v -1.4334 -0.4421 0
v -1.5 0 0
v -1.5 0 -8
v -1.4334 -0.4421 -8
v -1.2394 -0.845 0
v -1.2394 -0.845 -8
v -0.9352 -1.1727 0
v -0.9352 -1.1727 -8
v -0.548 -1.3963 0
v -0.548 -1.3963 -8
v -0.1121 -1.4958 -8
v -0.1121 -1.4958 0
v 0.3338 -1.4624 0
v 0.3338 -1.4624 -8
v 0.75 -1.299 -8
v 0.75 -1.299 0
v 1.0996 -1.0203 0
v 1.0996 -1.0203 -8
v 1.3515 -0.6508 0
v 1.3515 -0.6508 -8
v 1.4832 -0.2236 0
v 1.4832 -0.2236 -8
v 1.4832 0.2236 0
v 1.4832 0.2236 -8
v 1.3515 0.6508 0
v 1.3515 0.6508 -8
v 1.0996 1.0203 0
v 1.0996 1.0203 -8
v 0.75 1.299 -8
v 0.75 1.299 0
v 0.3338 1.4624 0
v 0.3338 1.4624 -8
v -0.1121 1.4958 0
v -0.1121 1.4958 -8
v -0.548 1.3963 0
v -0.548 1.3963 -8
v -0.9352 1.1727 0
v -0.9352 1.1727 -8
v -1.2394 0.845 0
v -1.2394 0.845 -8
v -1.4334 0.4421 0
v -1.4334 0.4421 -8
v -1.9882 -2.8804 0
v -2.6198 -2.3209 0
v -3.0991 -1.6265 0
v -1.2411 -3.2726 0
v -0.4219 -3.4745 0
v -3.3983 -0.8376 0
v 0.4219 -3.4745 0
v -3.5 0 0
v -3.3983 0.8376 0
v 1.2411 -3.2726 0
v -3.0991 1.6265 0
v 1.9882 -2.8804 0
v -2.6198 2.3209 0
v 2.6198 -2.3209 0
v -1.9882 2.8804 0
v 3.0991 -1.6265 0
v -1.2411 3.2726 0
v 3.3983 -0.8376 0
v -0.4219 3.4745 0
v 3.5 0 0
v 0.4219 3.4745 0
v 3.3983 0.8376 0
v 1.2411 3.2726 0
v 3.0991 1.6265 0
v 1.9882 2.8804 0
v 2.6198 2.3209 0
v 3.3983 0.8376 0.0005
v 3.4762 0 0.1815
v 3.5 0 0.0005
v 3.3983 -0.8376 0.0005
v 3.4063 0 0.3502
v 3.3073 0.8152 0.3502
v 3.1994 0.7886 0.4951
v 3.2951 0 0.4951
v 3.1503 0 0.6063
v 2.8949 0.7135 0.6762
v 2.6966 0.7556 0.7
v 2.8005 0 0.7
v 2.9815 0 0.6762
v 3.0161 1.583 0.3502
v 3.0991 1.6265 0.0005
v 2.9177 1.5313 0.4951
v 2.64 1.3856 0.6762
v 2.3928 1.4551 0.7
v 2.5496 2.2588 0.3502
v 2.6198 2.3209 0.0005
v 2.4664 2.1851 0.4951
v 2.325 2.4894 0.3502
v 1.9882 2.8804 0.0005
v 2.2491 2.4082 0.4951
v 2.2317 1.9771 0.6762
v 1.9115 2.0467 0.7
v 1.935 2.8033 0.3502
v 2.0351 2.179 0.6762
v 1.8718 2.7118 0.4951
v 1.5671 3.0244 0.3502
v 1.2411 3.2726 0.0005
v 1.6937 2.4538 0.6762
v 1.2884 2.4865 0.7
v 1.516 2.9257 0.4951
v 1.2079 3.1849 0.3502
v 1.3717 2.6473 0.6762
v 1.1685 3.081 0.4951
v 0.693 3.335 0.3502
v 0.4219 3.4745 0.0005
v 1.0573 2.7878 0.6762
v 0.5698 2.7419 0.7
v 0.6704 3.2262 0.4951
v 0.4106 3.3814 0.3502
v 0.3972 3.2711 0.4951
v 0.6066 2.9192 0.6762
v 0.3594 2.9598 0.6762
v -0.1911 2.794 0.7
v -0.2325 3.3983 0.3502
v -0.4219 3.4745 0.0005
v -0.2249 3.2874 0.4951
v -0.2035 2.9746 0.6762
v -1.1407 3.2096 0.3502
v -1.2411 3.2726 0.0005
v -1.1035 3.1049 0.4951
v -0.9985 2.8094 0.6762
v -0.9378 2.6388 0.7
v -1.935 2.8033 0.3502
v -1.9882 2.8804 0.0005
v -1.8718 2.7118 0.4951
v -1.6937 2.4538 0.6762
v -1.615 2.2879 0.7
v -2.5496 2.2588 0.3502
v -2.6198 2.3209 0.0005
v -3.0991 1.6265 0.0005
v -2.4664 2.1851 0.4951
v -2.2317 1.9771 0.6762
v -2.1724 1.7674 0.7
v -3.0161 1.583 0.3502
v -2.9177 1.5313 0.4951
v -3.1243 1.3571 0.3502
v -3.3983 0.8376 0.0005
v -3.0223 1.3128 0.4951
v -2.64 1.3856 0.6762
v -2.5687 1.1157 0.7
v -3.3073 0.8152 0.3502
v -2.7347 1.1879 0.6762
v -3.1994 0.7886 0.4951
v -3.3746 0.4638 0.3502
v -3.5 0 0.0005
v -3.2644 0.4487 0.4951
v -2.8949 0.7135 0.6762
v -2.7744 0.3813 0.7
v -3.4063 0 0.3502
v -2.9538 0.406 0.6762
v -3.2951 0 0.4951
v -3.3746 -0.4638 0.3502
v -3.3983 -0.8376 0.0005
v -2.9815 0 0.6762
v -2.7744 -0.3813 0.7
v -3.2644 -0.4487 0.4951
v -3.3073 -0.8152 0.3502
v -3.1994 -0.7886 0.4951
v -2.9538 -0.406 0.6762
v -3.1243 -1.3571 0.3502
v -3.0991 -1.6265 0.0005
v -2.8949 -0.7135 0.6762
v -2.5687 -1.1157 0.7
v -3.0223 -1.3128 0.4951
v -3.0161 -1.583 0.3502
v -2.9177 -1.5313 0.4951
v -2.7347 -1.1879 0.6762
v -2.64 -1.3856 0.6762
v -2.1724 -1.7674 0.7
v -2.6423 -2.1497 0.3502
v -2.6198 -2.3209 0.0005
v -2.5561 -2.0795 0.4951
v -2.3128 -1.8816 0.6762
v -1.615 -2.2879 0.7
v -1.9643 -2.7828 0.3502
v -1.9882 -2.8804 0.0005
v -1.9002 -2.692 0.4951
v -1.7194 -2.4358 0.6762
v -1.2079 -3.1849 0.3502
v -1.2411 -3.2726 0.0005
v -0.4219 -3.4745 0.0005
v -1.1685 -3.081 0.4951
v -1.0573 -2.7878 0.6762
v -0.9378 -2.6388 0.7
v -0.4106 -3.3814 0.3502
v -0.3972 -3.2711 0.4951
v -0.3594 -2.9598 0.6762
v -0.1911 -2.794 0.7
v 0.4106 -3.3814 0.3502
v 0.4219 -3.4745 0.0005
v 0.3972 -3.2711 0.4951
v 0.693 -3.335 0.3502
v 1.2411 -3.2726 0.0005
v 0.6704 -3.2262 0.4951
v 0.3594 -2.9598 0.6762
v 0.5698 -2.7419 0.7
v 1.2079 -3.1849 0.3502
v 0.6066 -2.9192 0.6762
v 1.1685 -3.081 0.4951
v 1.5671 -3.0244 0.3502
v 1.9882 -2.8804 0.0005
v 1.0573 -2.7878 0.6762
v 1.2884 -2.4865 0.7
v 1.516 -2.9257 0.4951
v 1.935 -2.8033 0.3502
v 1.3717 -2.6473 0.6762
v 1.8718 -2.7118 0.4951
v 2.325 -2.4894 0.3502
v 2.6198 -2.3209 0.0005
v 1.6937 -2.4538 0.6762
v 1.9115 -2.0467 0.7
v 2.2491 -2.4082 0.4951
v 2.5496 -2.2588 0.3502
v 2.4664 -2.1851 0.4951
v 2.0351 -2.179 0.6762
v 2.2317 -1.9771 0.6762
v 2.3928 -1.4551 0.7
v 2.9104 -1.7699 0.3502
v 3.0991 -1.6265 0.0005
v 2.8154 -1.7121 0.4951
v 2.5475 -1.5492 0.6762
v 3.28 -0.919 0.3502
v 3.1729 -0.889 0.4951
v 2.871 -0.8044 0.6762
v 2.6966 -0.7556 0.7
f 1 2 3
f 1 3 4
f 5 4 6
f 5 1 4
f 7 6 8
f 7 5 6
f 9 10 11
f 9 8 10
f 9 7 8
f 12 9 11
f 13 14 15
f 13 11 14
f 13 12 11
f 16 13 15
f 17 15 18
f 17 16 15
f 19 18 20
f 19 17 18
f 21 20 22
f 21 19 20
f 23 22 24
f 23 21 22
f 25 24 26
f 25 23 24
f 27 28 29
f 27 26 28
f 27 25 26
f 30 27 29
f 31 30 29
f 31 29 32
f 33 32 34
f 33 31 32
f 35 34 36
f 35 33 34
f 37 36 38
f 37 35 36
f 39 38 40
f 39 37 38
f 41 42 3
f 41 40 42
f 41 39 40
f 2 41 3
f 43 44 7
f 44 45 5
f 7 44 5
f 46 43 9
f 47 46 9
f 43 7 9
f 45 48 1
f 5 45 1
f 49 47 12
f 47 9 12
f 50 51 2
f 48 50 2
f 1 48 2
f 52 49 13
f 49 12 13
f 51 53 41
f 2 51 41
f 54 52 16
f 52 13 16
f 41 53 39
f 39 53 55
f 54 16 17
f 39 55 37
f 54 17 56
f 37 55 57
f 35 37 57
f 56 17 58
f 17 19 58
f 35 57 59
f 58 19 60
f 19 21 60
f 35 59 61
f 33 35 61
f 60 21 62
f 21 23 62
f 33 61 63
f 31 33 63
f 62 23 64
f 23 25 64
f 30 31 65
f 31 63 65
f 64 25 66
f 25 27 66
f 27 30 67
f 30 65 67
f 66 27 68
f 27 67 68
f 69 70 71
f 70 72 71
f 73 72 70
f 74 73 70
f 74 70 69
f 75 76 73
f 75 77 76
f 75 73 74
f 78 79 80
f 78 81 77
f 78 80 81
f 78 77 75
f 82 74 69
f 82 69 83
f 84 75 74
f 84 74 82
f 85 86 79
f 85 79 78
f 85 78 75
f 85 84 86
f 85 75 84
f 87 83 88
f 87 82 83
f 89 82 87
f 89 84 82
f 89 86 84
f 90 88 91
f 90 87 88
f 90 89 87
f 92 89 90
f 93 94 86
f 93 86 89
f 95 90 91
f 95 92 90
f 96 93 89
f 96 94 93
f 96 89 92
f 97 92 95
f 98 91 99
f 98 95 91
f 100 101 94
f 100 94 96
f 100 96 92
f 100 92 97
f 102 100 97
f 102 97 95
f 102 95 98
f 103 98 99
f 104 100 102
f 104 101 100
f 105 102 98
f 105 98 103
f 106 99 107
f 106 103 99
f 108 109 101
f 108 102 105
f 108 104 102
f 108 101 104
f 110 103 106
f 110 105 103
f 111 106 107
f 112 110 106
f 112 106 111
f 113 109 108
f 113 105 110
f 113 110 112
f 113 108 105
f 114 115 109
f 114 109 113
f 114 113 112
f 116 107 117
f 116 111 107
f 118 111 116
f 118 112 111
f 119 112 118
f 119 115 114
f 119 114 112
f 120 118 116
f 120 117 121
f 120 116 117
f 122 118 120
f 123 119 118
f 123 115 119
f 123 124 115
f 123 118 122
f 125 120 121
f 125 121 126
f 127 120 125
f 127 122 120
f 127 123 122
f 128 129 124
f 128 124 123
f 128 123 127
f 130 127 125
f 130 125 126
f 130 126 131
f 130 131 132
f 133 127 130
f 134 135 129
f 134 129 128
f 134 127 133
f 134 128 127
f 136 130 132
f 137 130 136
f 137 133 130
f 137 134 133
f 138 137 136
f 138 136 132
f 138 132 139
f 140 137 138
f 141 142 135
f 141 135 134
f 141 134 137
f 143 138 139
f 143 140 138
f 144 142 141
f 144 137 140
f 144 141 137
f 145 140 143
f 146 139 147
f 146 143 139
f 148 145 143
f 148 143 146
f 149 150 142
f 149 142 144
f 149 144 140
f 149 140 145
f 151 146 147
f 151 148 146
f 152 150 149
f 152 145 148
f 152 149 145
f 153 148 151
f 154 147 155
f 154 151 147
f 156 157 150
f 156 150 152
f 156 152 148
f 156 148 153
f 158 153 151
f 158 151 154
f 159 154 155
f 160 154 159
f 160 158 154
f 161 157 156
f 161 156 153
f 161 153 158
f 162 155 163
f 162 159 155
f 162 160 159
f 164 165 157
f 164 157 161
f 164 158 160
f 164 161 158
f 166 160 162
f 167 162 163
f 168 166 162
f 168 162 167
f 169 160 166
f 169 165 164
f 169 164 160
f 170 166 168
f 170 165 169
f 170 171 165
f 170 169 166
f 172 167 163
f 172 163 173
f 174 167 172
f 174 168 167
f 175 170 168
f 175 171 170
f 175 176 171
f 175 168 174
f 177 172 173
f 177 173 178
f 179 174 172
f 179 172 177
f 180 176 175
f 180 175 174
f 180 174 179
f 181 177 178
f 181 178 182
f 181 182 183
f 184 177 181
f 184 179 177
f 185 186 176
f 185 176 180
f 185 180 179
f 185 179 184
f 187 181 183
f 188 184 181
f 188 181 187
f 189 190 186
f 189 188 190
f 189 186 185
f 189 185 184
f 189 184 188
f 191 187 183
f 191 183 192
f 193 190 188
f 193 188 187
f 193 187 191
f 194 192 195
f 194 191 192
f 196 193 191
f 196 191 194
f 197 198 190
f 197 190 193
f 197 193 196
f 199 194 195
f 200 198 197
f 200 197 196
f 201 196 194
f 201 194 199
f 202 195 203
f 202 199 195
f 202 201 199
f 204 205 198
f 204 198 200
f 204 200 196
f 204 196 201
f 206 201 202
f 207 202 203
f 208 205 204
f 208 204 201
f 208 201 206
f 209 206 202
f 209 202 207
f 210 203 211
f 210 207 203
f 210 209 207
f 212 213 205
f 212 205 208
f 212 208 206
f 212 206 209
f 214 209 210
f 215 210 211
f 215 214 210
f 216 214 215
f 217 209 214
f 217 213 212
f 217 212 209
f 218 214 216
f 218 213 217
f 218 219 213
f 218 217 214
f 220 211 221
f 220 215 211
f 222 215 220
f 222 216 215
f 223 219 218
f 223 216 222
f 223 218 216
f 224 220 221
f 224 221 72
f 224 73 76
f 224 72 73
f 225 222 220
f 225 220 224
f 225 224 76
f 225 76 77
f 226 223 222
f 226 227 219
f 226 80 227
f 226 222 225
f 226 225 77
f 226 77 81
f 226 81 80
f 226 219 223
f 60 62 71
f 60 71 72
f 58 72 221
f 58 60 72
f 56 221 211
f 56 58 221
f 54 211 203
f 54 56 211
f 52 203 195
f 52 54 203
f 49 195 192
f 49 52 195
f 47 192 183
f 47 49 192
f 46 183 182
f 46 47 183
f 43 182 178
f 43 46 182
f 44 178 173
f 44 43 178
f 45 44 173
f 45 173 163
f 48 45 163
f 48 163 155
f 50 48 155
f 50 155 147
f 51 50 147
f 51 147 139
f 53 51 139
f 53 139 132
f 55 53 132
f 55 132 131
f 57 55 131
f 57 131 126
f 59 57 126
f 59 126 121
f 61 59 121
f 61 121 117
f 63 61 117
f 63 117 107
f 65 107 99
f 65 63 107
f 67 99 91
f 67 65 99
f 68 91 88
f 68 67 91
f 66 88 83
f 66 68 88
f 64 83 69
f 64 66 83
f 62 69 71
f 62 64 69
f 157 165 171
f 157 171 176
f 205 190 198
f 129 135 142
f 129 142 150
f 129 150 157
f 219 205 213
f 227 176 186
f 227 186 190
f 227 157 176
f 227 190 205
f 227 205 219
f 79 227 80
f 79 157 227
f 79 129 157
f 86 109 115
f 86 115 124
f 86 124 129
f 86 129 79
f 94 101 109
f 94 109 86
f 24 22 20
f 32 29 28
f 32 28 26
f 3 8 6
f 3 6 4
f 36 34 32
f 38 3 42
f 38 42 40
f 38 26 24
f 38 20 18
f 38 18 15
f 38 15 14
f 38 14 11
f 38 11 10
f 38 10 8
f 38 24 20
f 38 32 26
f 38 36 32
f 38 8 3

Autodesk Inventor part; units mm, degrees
ref_plane "YZ Plane" through (0, 0, 0) normal (1, 0, 0) x (0, 1, 0)
ref_plane "XZ Plane" through (0, 0, 0) normal (0, 1, 0) x (-1, 0, 0)
ref_plane "XY Plane" through (0, 0, 0) normal (0, 0, 1) x (1, 0, 0)
sketch "スケッチ1" plane through (0, 0, 0) normal (0, 0, 1) x (1, 0, 0)
  circle A0 centre (0, 0) radius 3.5
  dimension "d0" = 7
extrude "押し出し1" add sketch "スケッチ1" along normal blind 0.7
sketch "スケッチ2" plane through (0, 0, 0) normal (0, 0, -1) x (-1, 0, 0)
  circle A0 centre (0, 0) radius 1.5
  dimension "d3" = 3
extrude "押し出し2" add sketch "スケッチ2" along normal blind 8
thread "ねじ1" size "M3x0.5" class "6g" standard "ANSI Metric M Profile" full length
fillet "フィレット1" radius 0.7 1 edges at (-3.5, 0, 0.7)
properties part number "ネジ低頭m3.08" material "鋼、高強度、低合金"
